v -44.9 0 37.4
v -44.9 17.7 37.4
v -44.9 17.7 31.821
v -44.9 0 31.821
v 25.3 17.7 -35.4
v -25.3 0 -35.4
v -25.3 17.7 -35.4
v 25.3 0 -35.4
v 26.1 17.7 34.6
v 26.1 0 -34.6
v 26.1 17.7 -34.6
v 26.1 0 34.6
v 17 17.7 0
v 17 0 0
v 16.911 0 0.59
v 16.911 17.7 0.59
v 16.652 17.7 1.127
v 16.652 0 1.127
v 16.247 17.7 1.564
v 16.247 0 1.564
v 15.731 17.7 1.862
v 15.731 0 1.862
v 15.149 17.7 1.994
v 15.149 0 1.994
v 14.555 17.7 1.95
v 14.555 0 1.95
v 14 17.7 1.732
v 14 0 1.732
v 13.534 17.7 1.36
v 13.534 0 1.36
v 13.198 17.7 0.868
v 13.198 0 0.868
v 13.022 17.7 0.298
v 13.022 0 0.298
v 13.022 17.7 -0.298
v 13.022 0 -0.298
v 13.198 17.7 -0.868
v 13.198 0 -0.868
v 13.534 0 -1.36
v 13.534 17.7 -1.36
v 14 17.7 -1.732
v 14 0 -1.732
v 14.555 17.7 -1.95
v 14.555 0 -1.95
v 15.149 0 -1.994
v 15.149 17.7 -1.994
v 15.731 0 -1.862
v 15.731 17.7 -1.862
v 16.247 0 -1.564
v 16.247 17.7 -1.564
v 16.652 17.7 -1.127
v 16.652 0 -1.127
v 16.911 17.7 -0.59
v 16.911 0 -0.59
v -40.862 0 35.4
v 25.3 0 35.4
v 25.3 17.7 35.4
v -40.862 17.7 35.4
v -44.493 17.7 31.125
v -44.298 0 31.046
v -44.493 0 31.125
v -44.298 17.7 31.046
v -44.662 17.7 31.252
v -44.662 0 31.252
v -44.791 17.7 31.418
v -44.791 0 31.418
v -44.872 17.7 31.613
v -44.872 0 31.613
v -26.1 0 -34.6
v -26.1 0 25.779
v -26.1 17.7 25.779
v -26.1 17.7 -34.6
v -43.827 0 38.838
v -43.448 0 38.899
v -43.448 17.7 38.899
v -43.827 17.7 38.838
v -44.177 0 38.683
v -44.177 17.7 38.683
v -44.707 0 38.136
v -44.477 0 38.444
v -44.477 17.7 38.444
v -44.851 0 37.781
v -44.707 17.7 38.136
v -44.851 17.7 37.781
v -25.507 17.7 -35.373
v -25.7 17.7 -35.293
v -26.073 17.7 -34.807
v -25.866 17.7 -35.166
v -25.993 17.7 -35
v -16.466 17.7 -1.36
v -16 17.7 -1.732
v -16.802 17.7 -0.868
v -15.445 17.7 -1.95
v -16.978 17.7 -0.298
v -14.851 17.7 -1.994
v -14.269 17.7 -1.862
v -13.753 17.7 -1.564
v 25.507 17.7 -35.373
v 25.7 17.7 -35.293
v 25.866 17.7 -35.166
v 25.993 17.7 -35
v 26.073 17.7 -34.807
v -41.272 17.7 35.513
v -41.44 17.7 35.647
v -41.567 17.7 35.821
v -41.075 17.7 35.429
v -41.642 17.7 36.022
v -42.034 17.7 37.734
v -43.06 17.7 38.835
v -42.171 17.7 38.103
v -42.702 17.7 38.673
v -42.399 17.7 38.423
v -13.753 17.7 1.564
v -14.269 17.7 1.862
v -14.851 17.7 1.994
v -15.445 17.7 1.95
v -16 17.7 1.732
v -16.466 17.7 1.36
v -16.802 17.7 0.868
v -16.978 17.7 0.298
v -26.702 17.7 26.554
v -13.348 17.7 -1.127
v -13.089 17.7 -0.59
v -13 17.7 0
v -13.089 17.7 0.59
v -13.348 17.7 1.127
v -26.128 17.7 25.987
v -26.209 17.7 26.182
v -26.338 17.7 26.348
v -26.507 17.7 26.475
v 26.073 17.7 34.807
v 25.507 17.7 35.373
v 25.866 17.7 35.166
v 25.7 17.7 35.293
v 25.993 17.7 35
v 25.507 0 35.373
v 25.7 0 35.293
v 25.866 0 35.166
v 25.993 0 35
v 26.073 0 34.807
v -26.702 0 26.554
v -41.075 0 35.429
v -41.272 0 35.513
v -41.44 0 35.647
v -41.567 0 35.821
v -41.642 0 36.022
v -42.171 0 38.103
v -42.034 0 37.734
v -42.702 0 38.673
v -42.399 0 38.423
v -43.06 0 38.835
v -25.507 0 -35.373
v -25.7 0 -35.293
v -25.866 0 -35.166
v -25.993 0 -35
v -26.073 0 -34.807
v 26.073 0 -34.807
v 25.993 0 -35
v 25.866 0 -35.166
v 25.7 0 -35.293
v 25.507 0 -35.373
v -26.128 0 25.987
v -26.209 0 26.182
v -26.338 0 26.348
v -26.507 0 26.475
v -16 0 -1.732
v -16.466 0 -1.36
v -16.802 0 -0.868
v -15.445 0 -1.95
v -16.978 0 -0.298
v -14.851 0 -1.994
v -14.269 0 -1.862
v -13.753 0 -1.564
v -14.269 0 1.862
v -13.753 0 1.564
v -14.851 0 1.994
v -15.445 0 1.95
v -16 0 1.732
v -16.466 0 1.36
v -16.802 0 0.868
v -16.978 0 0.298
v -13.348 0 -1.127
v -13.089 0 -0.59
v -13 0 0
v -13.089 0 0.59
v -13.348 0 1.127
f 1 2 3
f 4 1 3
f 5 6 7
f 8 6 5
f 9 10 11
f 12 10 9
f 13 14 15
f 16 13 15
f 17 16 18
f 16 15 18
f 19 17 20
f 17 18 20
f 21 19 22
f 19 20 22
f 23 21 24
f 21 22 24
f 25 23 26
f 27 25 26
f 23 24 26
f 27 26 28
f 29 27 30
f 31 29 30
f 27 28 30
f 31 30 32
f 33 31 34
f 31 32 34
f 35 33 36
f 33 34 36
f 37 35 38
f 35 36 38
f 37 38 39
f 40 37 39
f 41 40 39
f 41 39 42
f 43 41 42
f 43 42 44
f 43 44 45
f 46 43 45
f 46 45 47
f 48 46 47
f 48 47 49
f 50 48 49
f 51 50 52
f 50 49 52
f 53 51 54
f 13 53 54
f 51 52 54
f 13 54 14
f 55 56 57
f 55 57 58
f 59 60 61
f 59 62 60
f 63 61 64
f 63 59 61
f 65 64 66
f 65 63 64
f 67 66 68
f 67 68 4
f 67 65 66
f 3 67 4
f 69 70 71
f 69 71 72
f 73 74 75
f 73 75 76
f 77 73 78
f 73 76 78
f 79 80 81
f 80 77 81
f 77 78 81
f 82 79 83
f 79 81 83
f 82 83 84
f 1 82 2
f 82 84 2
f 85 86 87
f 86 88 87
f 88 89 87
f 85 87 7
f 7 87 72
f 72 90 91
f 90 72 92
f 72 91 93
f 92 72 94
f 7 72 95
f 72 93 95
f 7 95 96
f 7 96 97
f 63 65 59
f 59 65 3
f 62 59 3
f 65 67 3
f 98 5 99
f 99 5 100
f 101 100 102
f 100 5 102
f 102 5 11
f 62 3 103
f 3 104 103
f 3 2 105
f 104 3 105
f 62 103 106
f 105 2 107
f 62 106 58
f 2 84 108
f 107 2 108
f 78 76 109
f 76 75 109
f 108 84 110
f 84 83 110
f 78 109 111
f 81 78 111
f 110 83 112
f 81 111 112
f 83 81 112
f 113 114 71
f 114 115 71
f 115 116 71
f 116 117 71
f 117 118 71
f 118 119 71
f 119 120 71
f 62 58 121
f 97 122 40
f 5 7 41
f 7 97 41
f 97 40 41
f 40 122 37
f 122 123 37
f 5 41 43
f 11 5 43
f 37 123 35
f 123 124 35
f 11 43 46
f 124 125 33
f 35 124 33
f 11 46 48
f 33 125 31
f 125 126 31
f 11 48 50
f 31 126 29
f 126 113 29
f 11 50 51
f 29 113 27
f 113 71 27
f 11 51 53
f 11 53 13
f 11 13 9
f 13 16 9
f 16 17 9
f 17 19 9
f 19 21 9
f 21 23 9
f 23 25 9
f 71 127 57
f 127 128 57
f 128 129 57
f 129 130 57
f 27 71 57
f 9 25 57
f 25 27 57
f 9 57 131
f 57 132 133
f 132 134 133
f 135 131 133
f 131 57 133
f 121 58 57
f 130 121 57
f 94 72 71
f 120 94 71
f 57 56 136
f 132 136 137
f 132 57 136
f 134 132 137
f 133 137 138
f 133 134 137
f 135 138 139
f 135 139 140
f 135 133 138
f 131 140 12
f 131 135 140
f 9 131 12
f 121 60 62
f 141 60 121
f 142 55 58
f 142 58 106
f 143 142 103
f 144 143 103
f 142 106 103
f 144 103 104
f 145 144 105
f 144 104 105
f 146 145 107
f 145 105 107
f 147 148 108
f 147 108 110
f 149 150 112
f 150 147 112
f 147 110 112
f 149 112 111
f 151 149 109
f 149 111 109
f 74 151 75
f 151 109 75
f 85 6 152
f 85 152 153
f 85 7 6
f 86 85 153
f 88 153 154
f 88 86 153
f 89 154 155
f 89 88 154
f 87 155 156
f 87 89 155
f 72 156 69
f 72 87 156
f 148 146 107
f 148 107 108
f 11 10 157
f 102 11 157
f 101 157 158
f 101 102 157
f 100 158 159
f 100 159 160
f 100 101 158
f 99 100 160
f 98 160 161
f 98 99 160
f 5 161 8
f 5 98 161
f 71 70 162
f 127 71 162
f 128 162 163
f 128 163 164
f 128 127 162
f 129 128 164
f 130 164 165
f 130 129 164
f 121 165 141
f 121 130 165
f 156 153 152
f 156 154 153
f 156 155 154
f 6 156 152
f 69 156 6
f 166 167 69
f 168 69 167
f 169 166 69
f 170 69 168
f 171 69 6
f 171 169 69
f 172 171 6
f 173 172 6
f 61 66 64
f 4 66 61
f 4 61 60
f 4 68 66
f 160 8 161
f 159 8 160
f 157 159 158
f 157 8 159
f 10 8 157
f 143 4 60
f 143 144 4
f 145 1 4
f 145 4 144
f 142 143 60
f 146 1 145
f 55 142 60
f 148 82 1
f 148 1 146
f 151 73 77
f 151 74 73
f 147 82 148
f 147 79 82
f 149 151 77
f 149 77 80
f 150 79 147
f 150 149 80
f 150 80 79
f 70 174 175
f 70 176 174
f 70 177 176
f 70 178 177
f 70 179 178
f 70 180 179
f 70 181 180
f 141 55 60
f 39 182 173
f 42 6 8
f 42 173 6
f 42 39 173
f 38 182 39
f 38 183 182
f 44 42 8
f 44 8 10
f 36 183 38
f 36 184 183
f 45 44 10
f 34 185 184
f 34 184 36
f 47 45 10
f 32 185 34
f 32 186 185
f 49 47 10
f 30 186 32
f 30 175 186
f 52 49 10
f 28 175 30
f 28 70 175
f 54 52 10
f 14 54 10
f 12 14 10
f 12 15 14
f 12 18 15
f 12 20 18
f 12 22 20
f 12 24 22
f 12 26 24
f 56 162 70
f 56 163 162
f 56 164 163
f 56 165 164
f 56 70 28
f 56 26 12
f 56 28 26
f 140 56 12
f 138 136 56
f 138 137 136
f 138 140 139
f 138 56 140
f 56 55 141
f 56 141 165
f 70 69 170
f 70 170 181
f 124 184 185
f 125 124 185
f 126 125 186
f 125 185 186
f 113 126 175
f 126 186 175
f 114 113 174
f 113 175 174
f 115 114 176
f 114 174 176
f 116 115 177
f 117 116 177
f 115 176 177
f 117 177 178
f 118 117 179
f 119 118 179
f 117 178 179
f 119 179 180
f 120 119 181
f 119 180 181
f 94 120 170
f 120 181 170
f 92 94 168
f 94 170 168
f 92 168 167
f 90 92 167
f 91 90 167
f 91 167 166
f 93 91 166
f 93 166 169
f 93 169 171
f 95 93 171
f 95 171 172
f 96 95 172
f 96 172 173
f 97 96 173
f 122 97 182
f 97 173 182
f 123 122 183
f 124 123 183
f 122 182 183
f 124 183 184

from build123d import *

# Parameters (mm, degrees)
F0_R        = 2
F1_DEPTH    = 17.7
F2_T1_DEPTH = 25.2
F2_T3_DEPTH = 23.679138459
F3_R        = 0.8


# Not quite as in the source:
# - a fillet or chamfer that OpenCascade refuses, or shapes differently, is made with other operations: its cross-section is extruded or revolved along the edge and cut away or added


with BuildPart() as f1:
    # F0 (on Front) → F1 (new body)
    with BuildSketch(Plane.XZ):
        Polygon((26.1, 35.4), (-41.5, 35.4), (-42.3, 38.9), (-44.9, 38.9), (-44.9, 31.2), (-26.1, 26.4), (-26.1, -35.4), (26.1, -35.4), align=None)
        with Locations((-15, 0)):
            Circle(F0_R, mode=Mode.SUBTRACT)
        with Locations((15, 0)):
            Circle(F0_R, mode=Mode.SUBTRACT)
    extrude(amount=-F1_DEPTH)

    # F2: fillet of radius 1.5 on 2 edges, made by hand

    # F2_s2 → F2_t1 (cut)
    with BuildSketch(Plane.XZ.offset(-21.45)):
        with BuildLine():
            ThreePointArc((-43.4, 38.9), (-44.4606601718, 38.4606601718), (-44.9, 37.4))
            Line((-44.9, 37.4), (-44.9, 38.9))
            Line((-44.9, 38.9), (-43.4, 38.9))
        make_face()
    extrude(amount=F2_T1_DEPTH, mode=Mode.SUBTRACT)

    # F2_s4 → F2_t3 (cut)
    with BuildSketch(Plane.XZ.offset(-20.6895692295)):
        with BuildLine():
            ThreePointArc((-42.0335399319, 37.7342372023), (-42.560775769, 38.5728929626), (-43.4958276918, 38.9))
            Line((-43.4958276918, 38.9), (-42.3, 38.9))
            Line((-42.3, 38.9), (-42.0335399319, 37.7342372023))
        make_face()
    extrude(amount=F2_T3_DEPTH, mode=Mode.SUBTRACT)

    # F3
    f3_edges = [f1.edges().sort_by_distance(p)[0] for p in [
        (-41.5, 8.85, 35.4),
        (26.1, 8.85, 35.4),
        (26.1, 8.85, -35.4),
        (-44.9, 8.85, 31.2),
        (-26.1, 8.85, 26.4),
        (-26.1, 8.85, -35.4),
    ]]
    fillet(f3_edges, radius=F3_R)


solid = f1.part
